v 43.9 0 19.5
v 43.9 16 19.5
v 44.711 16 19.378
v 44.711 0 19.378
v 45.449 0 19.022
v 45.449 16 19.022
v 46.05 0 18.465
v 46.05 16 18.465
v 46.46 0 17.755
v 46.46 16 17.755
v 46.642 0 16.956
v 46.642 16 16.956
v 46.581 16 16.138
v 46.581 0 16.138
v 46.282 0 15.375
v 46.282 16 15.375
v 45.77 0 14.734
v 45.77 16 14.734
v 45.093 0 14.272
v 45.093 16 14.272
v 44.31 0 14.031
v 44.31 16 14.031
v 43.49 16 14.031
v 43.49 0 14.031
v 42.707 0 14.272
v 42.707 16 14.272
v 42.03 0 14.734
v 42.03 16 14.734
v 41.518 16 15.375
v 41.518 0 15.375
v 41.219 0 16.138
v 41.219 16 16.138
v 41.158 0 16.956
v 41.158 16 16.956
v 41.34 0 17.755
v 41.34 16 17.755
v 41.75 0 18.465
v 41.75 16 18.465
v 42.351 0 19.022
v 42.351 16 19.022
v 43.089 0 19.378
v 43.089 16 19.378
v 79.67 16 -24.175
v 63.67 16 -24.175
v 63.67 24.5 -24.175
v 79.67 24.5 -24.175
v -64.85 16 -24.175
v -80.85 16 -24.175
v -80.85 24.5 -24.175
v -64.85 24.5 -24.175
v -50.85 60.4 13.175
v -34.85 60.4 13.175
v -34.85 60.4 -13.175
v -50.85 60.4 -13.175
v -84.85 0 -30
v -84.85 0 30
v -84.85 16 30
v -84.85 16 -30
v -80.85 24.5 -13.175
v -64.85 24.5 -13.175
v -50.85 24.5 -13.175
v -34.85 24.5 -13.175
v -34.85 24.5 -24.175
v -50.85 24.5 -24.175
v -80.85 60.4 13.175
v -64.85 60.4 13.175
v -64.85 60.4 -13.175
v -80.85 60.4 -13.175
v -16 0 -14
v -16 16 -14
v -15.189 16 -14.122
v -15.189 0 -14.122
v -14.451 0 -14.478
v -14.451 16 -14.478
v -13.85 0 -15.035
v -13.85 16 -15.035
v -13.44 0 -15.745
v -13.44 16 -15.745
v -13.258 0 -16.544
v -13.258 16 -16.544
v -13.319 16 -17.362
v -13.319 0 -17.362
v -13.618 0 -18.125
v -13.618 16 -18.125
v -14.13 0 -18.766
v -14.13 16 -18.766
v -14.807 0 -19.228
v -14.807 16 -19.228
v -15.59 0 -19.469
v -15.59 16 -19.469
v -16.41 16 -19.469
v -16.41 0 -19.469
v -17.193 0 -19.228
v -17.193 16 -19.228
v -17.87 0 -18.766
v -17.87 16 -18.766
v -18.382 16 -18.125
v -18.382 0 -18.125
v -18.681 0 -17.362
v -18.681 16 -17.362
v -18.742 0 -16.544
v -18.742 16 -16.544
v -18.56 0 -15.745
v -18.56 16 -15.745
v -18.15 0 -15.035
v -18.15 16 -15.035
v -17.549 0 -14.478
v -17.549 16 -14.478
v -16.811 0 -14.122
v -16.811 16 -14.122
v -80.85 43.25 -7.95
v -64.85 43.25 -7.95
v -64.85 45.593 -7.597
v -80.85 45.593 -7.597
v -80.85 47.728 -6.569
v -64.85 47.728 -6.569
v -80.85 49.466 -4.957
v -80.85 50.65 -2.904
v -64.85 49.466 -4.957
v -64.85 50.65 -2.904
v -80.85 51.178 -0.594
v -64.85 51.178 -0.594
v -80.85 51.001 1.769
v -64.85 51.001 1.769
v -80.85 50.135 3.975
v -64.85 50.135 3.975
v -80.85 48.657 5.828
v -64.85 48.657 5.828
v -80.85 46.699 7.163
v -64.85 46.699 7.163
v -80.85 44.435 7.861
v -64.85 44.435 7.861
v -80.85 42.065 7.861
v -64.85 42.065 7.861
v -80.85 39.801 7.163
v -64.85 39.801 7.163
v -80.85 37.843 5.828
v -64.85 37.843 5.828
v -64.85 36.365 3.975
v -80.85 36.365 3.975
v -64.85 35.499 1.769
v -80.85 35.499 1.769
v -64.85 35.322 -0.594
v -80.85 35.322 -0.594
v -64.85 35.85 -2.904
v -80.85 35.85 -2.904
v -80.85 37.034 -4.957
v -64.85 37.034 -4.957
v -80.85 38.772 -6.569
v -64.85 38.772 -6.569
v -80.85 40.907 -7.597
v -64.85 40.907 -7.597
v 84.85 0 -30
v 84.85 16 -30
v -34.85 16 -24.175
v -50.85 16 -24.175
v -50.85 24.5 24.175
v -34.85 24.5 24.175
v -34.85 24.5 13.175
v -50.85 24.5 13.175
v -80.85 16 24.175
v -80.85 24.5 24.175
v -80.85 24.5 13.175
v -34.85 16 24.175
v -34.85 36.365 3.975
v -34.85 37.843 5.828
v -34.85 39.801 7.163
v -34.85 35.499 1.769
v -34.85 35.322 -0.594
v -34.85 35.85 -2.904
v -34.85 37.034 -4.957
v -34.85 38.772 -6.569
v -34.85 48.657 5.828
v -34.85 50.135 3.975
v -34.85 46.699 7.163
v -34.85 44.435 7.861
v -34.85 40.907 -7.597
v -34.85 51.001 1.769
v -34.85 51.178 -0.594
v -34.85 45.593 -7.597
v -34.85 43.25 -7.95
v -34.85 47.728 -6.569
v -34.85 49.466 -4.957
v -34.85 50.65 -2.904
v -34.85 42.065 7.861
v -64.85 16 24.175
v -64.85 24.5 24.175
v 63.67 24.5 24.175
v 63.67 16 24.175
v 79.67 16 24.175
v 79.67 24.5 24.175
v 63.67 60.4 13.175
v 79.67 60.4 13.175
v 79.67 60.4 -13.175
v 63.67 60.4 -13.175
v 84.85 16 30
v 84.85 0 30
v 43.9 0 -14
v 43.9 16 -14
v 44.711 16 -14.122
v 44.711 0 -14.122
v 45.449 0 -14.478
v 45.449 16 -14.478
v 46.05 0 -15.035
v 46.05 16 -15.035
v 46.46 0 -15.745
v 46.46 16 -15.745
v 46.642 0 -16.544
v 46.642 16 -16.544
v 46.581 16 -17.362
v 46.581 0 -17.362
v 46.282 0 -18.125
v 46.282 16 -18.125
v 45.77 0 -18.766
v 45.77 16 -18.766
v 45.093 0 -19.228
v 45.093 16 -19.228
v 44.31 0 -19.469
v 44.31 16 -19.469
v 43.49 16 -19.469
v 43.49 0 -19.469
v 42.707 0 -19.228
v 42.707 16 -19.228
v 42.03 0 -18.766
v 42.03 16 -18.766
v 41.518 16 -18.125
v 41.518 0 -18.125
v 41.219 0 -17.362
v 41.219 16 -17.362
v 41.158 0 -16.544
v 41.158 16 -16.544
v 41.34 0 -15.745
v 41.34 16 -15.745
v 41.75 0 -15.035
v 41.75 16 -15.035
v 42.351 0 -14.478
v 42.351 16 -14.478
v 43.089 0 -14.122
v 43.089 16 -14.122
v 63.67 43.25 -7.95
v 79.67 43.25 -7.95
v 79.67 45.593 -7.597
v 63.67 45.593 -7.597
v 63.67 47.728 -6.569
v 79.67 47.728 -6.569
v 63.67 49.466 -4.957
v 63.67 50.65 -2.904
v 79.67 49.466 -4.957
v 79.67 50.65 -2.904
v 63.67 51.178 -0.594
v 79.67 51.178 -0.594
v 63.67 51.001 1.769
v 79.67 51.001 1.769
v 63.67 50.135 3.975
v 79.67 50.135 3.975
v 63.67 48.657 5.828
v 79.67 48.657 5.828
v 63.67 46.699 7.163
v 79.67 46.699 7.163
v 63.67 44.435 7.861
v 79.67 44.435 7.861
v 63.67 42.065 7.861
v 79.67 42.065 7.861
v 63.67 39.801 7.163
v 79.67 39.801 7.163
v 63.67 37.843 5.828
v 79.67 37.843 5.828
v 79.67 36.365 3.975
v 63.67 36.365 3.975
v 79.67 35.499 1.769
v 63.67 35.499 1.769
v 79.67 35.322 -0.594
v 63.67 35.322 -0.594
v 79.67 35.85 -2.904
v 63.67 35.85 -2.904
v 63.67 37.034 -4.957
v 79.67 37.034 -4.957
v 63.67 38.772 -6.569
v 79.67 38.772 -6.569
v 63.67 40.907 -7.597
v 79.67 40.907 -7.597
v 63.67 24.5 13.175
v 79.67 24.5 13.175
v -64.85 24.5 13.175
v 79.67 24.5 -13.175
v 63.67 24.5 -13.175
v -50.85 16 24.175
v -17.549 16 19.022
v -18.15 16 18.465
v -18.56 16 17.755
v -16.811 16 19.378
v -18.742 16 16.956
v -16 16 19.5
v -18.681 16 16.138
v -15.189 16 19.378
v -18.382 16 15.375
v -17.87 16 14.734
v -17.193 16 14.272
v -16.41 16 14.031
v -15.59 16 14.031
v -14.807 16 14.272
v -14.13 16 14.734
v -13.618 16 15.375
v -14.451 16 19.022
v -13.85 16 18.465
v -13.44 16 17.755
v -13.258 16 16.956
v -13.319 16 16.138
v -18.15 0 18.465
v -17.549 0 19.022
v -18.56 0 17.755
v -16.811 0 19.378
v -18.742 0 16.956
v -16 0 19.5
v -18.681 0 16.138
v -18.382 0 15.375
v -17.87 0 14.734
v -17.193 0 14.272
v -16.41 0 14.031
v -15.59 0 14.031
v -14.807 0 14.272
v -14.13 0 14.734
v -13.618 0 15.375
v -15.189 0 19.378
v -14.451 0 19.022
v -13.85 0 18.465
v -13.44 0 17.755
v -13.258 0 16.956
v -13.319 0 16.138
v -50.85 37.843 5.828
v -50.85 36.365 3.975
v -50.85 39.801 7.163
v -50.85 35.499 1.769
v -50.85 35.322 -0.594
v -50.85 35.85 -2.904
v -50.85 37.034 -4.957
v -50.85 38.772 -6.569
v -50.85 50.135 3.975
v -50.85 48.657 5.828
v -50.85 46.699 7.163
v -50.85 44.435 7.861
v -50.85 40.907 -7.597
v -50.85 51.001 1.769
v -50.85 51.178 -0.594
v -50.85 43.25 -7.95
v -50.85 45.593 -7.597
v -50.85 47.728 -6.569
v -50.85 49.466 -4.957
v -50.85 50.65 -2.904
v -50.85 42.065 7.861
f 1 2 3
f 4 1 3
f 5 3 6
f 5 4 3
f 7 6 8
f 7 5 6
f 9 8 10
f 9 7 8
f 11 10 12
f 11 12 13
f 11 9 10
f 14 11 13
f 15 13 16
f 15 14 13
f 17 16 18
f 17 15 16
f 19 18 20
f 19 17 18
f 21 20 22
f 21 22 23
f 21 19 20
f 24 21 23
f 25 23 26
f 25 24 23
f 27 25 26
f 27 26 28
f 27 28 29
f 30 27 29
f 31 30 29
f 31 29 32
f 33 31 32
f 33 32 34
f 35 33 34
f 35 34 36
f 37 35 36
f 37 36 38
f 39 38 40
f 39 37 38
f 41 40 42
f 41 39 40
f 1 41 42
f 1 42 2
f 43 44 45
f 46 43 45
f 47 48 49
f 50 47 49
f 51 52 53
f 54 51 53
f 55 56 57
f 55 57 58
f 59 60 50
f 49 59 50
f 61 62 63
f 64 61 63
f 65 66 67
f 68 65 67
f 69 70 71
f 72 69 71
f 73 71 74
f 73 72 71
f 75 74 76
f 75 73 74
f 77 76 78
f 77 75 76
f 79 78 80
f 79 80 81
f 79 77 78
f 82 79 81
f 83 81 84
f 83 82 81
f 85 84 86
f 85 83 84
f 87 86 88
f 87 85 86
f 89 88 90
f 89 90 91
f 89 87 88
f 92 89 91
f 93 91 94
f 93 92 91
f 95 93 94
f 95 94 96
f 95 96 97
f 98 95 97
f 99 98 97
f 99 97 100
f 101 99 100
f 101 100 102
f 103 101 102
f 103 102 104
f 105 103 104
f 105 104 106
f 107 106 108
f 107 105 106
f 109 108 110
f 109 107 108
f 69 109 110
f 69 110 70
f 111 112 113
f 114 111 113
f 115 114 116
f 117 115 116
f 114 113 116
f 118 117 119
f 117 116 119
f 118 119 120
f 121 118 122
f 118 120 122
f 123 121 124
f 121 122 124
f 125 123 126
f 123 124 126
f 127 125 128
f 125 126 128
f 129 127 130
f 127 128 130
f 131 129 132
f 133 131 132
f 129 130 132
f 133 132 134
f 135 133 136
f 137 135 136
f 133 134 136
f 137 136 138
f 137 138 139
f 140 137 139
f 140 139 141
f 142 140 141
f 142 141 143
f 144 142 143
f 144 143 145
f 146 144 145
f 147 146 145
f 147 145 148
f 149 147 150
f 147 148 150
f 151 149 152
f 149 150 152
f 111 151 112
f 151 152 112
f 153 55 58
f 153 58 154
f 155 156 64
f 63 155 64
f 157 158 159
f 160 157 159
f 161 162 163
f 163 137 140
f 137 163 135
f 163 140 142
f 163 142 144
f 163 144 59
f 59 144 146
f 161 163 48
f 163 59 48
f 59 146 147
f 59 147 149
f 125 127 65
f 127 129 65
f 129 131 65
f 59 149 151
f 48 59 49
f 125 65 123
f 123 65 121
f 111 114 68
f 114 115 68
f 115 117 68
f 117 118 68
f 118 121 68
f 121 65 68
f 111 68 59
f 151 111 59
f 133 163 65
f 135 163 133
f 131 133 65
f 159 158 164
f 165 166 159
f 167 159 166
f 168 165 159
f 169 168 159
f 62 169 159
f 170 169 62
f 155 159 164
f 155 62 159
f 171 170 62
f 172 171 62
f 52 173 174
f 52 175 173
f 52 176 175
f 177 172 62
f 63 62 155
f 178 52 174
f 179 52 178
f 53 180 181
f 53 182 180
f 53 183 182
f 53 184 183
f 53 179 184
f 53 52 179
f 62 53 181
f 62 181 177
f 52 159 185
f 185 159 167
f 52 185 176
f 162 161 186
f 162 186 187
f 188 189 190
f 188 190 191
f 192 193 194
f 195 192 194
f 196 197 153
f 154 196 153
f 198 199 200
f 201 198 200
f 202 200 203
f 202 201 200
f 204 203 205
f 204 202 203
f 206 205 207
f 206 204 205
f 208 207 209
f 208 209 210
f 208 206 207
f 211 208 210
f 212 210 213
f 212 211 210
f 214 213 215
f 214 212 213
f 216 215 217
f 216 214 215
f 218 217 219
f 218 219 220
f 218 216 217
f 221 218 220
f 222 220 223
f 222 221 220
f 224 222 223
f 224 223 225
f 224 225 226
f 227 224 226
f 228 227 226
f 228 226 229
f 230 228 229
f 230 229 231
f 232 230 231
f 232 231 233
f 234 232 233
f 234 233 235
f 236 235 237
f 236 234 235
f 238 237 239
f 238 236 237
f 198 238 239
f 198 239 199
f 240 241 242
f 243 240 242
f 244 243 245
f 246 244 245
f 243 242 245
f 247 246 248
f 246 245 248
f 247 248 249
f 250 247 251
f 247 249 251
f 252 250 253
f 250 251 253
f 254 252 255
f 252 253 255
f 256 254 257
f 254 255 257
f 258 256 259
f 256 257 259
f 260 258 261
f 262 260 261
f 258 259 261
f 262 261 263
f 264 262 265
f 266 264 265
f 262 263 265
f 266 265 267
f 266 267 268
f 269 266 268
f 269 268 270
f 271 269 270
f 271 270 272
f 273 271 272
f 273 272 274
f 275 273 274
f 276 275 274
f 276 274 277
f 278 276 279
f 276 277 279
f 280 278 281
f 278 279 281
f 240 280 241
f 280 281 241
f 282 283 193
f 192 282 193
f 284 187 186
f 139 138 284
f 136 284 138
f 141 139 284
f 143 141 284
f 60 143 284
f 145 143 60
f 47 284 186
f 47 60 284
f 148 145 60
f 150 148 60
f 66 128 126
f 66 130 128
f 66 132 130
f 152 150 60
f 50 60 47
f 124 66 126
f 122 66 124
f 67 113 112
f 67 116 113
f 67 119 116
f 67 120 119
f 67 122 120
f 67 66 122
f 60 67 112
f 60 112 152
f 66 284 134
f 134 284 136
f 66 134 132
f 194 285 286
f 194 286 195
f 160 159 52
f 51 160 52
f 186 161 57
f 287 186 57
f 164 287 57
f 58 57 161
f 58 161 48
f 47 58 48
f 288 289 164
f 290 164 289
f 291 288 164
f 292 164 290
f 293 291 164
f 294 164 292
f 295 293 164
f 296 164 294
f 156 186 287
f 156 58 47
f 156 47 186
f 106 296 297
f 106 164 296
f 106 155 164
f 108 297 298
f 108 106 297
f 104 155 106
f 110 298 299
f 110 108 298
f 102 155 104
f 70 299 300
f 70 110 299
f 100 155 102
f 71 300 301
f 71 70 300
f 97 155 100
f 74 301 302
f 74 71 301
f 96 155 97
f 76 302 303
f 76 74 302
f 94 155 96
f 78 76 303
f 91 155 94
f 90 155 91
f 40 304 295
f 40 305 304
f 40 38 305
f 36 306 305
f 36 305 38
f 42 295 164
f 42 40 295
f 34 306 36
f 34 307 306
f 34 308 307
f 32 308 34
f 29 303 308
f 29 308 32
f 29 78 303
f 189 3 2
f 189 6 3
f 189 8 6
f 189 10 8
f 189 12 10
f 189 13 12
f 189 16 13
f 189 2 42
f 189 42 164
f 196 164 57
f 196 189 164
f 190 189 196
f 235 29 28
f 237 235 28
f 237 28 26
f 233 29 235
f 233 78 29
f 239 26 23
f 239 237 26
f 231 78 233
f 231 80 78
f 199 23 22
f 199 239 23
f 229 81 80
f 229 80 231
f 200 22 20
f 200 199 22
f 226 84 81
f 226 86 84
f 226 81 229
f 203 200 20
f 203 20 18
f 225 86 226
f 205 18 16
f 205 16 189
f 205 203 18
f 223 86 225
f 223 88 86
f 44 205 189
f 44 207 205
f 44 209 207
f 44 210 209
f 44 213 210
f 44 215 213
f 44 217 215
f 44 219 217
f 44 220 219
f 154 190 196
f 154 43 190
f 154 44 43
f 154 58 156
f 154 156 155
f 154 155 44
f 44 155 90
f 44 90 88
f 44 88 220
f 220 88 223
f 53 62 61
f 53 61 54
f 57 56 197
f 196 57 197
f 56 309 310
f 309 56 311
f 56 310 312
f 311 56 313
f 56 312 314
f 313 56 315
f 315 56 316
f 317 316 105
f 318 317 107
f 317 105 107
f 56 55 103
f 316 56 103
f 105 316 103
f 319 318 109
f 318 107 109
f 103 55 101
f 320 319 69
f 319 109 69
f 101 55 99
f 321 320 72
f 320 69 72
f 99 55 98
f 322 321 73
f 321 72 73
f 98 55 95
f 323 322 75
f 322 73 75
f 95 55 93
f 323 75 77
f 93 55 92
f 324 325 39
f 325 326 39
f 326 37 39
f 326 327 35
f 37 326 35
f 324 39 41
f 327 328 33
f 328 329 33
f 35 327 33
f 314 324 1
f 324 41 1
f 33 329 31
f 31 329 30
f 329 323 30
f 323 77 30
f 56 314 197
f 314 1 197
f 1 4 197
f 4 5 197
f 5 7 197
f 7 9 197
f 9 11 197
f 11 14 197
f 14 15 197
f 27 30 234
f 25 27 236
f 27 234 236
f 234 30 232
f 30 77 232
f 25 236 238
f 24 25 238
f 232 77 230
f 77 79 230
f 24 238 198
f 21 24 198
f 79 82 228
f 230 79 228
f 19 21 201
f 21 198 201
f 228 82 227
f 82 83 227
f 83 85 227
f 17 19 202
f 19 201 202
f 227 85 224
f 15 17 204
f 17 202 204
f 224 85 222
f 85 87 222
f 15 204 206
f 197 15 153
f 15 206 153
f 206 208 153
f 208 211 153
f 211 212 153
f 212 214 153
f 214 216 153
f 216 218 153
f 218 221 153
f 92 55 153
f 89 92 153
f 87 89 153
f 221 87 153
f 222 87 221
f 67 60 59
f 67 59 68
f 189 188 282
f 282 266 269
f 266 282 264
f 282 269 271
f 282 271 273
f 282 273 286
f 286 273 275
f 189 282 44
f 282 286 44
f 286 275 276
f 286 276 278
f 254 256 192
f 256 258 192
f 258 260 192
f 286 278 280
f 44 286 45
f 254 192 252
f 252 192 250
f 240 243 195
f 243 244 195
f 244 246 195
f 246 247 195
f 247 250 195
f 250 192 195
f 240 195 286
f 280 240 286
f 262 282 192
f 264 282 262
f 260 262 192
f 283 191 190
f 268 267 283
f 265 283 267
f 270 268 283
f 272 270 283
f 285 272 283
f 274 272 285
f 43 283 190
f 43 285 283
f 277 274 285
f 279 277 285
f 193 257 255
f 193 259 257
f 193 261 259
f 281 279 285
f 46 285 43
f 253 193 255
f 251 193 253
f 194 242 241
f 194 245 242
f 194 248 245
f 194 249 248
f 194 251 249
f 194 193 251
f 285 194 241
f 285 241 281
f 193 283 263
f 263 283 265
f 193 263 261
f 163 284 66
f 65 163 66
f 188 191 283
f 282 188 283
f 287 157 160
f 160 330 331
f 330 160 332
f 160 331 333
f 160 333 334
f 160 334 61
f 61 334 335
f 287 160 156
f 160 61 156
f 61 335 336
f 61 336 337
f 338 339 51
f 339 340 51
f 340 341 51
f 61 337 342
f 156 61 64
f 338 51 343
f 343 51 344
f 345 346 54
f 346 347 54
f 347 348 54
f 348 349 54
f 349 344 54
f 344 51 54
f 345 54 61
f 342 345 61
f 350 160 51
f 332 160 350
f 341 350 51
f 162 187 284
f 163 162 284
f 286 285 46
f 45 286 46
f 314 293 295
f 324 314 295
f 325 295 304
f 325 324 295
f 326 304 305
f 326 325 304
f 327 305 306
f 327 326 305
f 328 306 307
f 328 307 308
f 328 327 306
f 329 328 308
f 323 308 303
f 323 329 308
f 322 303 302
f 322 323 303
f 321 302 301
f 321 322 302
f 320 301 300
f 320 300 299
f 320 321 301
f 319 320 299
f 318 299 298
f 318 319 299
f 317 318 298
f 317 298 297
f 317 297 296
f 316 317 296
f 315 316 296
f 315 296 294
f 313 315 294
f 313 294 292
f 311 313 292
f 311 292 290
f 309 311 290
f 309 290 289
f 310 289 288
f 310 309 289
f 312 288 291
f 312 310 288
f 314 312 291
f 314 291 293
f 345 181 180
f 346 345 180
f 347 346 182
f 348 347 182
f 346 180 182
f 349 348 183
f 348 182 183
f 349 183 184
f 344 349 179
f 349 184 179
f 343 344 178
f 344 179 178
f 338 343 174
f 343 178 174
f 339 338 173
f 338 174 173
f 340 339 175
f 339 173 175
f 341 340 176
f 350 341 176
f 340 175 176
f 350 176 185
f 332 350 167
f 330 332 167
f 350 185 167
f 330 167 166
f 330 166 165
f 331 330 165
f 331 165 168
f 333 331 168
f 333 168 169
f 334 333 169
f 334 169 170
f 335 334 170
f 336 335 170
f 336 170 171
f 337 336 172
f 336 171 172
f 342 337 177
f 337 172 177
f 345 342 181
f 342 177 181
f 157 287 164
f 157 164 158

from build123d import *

# Parameters (mm, degrees)
SKETCH1_W           = 169.7
SKETCH1_H           = 60
SKETCH1_R           = 2.75
BOSS_EXTRUDE1_DEPTH = 16
BOSS_EXTRUDE2_START = -5.18
SKETCH2_W           = 48.35
SKETCH2_H           = 8.5
SKETCH2_W_2         = 26.35
SKETCH2_H_2         = 35.9
SKETCH2_R           = 7.95
BOSS_EXTRUDE2_DEPTH = 16
BOSS_EXTRUDE3_START = -149.7
SKETCH2_3_W         = 48.35
SKETCH2_3_H         = 8.5
SKETCH2_3_W_2       = 26.35
SKETCH2_3_H_2       = 35.9
SKETCH2_3_R         = 7.95
BOSS_EXTRUDE3_DEPTH = 16
LPATTERN1_COUNT     = 2
LPATTERN1_PITCH     = 30


with BuildPart() as part:
    # Sketch1 → Boss-Extrude1 (new body)
    with BuildSketch(Plane(origin=(0, 0, 0), x_dir=(1, 0, 0), z_dir=(0, 1, 0))):
        Rectangle(SKETCH1_W, SKETCH1_H)
        with Locations(Location((-16, -16.75, 0), (0, 0, 270))):
            Circle(SKETCH1_R, mode=Mode.SUBTRACT)
        with Locations(Location((43.9, -16.75, 0), (0, 0, 270))):
            Circle(SKETCH1_R, mode=Mode.SUBTRACT)
        with Locations(Location((43.9, 16.75, 0), (0, 0, 270))):
            Circle(SKETCH1_R, mode=Mode.SUBTRACT)
        with Locations(Location((-16, 16.75, 0), (0, 0, 270))):
            Circle(SKETCH1_R, mode=Mode.SUBTRACT)
    extrude(amount=BOSS_EXTRUDE1_DEPTH)

    # Sketch2 → Boss-Extrude2 (add)
    # profile 1 of 2: a face of its own
    with BuildSketch(Plane(origin=(84.85, 0, 0), x_dir=(0, 0, -1), z_dir=(1, 0, 0)).offset(BOSS_EXTRUDE2_START)):
        with Locations((0, 20.25)):
            Rectangle(SKETCH2_W, SKETCH2_H)
    # profile 2 of 2: a face of its own
    with BuildSketch(Plane(origin=(84.85, 0, 0), x_dir=(0, 0, -1), z_dir=(1, 0, 0)).offset(BOSS_EXTRUDE2_START)):
        with Locations((0, 42.45)):
            Rectangle(SKETCH2_W_2, SKETCH2_H_2)
        with Locations((0, 43.25)):
            Circle(SKETCH2_R, mode=Mode.SUBTRACT)
    extrude(amount=-BOSS_EXTRUDE2_DEPTH)

    # Sketch2<3> → Boss-Extrude3 (add)
    # profile 1 of 2: a face of its own
    with BuildSketch(Plane(origin=(84.85, 0, 0), x_dir=(0, 0, -1), z_dir=(1, 0, 0)).offset(BOSS_EXTRUDE3_START)):
        with Locations((0, 20.25)):
            Rectangle(SKETCH2_3_W, SKETCH2_3_H)
    # profile 2 of 2: a face of its own
    with BuildSketch(Plane(origin=(84.85, 0, 0), x_dir=(0, 0, -1), z_dir=(1, 0, 0)).offset(BOSS_EXTRUDE3_START)):
        with Locations((0, 42.45)):
            Rectangle(SKETCH2_3_W_2, SKETCH2_3_H_2)
        with Locations((0, 43.25)):
            Circle(SKETCH2_3_R, mode=Mode.SUBTRACT)
    boss_extrude3 = extrude(amount=-BOSS_EXTRUDE3_DEPTH)

    # LPattern1: Boss-Extrude3 ×2
    with Locations(*[(i * LPATTERN1_PITCH, 0, 0) for i in range(1, LPATTERN1_COUNT)]):
        add(boss_extrude3)


solid = part.part
